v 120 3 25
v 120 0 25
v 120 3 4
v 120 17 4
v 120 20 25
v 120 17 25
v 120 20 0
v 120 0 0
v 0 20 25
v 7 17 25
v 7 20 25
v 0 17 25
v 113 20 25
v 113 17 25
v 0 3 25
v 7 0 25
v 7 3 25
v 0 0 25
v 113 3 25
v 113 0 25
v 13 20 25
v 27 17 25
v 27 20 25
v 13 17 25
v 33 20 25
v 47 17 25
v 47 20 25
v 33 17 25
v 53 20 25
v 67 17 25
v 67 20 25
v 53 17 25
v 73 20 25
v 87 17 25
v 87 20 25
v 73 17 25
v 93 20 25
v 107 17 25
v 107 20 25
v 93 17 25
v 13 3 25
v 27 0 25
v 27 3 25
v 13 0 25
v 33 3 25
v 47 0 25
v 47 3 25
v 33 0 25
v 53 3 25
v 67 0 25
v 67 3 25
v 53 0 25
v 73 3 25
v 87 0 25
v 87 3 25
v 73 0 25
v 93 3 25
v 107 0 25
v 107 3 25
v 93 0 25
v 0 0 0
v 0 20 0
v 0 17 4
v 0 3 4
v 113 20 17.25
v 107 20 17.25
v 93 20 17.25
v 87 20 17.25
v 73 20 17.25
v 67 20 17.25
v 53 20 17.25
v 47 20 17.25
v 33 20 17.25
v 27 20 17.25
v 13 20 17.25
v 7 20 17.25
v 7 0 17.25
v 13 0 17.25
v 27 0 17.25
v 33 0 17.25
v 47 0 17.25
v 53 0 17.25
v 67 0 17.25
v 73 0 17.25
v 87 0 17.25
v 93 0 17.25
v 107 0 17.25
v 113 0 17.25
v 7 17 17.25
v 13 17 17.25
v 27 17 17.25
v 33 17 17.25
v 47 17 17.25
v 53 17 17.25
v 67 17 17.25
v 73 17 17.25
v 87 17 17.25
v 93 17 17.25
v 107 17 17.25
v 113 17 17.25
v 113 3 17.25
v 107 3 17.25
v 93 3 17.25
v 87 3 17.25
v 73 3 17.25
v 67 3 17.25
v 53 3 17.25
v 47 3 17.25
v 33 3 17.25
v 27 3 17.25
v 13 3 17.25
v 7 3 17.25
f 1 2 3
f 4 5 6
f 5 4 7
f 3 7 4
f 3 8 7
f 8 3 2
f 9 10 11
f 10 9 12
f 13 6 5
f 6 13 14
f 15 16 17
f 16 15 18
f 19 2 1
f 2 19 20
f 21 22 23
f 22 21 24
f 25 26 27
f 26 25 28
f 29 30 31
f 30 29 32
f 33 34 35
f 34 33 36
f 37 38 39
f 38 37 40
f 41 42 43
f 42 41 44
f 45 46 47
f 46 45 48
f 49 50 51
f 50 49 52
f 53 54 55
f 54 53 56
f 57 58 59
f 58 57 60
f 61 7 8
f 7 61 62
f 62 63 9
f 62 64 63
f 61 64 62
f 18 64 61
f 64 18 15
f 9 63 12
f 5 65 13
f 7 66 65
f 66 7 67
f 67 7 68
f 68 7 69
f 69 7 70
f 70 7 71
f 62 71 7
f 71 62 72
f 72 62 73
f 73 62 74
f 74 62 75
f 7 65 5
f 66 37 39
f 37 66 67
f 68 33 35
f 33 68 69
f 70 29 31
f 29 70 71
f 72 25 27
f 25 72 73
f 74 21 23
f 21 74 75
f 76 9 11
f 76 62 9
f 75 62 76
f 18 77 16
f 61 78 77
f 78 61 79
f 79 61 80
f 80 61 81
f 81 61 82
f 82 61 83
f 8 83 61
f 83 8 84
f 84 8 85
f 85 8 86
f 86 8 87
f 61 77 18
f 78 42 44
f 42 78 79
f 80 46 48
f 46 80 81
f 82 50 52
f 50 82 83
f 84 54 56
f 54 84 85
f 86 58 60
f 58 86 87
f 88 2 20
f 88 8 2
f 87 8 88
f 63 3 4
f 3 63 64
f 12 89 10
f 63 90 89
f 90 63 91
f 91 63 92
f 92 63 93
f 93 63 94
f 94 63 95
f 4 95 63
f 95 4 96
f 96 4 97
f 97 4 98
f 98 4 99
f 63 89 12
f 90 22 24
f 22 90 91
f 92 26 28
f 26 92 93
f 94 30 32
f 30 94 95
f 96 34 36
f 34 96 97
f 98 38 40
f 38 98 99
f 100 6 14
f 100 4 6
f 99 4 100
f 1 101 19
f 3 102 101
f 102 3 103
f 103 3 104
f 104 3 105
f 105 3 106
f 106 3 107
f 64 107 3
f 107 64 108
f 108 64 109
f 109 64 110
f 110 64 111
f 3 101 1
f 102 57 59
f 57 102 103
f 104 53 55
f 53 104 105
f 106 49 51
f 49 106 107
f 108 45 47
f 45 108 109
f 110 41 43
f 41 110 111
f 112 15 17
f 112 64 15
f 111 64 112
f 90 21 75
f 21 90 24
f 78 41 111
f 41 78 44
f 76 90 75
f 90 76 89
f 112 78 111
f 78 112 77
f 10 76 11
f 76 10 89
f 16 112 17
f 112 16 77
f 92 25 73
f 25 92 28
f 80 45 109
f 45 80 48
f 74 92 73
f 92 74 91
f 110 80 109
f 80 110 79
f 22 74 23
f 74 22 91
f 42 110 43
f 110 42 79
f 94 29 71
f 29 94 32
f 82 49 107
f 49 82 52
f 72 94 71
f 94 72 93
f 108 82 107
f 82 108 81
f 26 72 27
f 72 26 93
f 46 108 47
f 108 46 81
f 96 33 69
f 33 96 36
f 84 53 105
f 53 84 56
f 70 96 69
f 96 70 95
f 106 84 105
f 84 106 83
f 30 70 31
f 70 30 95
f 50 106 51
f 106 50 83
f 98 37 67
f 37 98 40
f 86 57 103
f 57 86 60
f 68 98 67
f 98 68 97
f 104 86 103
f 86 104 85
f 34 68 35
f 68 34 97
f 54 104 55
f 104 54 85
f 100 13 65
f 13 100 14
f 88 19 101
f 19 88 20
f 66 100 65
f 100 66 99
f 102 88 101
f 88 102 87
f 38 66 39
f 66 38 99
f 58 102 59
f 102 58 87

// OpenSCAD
$fn = 32;

// ----------------------------------------------------------------------
// Cable duct: 120 x 20 x 25 mm, 6 fingers
// ----------------------------------------------------------------------

// --- parameters (mm) ---
channel_l = 120;          // duct length, X
channel_w = 20;           // duct width, Y
channel_h = 25;           // duct height, Z
channel_t = 3;            // side wall thickness
floor_t = 4;              // floor thickness
slot_w = 6;               // finger slot width
slot_h = 13.25;           // finger slot height
fingers = 6;              // number of finger slots per side
pitch = 20;               // finger pitch

module shell() {
  difference() {
    cube([channel_l, channel_w, channel_h]);
    /* open top channel */
    translate([-channel_t - 1, channel_t, floor_t])
      cube([channel_l + 2 * channel_t + 2, channel_w - 2 * channel_t, channel_h + 1]);
  }
}

difference() {
  union() {
    shell();
  }
  /* finger slots cut through both side walls */
  for (i = [0 : fingers - 1]) translate([pitch / 2 + i * pitch - slot_w / 2, -1, floor_t + slot_h]) cube([slot_w, channel_w + 2, channel_h]);
}
